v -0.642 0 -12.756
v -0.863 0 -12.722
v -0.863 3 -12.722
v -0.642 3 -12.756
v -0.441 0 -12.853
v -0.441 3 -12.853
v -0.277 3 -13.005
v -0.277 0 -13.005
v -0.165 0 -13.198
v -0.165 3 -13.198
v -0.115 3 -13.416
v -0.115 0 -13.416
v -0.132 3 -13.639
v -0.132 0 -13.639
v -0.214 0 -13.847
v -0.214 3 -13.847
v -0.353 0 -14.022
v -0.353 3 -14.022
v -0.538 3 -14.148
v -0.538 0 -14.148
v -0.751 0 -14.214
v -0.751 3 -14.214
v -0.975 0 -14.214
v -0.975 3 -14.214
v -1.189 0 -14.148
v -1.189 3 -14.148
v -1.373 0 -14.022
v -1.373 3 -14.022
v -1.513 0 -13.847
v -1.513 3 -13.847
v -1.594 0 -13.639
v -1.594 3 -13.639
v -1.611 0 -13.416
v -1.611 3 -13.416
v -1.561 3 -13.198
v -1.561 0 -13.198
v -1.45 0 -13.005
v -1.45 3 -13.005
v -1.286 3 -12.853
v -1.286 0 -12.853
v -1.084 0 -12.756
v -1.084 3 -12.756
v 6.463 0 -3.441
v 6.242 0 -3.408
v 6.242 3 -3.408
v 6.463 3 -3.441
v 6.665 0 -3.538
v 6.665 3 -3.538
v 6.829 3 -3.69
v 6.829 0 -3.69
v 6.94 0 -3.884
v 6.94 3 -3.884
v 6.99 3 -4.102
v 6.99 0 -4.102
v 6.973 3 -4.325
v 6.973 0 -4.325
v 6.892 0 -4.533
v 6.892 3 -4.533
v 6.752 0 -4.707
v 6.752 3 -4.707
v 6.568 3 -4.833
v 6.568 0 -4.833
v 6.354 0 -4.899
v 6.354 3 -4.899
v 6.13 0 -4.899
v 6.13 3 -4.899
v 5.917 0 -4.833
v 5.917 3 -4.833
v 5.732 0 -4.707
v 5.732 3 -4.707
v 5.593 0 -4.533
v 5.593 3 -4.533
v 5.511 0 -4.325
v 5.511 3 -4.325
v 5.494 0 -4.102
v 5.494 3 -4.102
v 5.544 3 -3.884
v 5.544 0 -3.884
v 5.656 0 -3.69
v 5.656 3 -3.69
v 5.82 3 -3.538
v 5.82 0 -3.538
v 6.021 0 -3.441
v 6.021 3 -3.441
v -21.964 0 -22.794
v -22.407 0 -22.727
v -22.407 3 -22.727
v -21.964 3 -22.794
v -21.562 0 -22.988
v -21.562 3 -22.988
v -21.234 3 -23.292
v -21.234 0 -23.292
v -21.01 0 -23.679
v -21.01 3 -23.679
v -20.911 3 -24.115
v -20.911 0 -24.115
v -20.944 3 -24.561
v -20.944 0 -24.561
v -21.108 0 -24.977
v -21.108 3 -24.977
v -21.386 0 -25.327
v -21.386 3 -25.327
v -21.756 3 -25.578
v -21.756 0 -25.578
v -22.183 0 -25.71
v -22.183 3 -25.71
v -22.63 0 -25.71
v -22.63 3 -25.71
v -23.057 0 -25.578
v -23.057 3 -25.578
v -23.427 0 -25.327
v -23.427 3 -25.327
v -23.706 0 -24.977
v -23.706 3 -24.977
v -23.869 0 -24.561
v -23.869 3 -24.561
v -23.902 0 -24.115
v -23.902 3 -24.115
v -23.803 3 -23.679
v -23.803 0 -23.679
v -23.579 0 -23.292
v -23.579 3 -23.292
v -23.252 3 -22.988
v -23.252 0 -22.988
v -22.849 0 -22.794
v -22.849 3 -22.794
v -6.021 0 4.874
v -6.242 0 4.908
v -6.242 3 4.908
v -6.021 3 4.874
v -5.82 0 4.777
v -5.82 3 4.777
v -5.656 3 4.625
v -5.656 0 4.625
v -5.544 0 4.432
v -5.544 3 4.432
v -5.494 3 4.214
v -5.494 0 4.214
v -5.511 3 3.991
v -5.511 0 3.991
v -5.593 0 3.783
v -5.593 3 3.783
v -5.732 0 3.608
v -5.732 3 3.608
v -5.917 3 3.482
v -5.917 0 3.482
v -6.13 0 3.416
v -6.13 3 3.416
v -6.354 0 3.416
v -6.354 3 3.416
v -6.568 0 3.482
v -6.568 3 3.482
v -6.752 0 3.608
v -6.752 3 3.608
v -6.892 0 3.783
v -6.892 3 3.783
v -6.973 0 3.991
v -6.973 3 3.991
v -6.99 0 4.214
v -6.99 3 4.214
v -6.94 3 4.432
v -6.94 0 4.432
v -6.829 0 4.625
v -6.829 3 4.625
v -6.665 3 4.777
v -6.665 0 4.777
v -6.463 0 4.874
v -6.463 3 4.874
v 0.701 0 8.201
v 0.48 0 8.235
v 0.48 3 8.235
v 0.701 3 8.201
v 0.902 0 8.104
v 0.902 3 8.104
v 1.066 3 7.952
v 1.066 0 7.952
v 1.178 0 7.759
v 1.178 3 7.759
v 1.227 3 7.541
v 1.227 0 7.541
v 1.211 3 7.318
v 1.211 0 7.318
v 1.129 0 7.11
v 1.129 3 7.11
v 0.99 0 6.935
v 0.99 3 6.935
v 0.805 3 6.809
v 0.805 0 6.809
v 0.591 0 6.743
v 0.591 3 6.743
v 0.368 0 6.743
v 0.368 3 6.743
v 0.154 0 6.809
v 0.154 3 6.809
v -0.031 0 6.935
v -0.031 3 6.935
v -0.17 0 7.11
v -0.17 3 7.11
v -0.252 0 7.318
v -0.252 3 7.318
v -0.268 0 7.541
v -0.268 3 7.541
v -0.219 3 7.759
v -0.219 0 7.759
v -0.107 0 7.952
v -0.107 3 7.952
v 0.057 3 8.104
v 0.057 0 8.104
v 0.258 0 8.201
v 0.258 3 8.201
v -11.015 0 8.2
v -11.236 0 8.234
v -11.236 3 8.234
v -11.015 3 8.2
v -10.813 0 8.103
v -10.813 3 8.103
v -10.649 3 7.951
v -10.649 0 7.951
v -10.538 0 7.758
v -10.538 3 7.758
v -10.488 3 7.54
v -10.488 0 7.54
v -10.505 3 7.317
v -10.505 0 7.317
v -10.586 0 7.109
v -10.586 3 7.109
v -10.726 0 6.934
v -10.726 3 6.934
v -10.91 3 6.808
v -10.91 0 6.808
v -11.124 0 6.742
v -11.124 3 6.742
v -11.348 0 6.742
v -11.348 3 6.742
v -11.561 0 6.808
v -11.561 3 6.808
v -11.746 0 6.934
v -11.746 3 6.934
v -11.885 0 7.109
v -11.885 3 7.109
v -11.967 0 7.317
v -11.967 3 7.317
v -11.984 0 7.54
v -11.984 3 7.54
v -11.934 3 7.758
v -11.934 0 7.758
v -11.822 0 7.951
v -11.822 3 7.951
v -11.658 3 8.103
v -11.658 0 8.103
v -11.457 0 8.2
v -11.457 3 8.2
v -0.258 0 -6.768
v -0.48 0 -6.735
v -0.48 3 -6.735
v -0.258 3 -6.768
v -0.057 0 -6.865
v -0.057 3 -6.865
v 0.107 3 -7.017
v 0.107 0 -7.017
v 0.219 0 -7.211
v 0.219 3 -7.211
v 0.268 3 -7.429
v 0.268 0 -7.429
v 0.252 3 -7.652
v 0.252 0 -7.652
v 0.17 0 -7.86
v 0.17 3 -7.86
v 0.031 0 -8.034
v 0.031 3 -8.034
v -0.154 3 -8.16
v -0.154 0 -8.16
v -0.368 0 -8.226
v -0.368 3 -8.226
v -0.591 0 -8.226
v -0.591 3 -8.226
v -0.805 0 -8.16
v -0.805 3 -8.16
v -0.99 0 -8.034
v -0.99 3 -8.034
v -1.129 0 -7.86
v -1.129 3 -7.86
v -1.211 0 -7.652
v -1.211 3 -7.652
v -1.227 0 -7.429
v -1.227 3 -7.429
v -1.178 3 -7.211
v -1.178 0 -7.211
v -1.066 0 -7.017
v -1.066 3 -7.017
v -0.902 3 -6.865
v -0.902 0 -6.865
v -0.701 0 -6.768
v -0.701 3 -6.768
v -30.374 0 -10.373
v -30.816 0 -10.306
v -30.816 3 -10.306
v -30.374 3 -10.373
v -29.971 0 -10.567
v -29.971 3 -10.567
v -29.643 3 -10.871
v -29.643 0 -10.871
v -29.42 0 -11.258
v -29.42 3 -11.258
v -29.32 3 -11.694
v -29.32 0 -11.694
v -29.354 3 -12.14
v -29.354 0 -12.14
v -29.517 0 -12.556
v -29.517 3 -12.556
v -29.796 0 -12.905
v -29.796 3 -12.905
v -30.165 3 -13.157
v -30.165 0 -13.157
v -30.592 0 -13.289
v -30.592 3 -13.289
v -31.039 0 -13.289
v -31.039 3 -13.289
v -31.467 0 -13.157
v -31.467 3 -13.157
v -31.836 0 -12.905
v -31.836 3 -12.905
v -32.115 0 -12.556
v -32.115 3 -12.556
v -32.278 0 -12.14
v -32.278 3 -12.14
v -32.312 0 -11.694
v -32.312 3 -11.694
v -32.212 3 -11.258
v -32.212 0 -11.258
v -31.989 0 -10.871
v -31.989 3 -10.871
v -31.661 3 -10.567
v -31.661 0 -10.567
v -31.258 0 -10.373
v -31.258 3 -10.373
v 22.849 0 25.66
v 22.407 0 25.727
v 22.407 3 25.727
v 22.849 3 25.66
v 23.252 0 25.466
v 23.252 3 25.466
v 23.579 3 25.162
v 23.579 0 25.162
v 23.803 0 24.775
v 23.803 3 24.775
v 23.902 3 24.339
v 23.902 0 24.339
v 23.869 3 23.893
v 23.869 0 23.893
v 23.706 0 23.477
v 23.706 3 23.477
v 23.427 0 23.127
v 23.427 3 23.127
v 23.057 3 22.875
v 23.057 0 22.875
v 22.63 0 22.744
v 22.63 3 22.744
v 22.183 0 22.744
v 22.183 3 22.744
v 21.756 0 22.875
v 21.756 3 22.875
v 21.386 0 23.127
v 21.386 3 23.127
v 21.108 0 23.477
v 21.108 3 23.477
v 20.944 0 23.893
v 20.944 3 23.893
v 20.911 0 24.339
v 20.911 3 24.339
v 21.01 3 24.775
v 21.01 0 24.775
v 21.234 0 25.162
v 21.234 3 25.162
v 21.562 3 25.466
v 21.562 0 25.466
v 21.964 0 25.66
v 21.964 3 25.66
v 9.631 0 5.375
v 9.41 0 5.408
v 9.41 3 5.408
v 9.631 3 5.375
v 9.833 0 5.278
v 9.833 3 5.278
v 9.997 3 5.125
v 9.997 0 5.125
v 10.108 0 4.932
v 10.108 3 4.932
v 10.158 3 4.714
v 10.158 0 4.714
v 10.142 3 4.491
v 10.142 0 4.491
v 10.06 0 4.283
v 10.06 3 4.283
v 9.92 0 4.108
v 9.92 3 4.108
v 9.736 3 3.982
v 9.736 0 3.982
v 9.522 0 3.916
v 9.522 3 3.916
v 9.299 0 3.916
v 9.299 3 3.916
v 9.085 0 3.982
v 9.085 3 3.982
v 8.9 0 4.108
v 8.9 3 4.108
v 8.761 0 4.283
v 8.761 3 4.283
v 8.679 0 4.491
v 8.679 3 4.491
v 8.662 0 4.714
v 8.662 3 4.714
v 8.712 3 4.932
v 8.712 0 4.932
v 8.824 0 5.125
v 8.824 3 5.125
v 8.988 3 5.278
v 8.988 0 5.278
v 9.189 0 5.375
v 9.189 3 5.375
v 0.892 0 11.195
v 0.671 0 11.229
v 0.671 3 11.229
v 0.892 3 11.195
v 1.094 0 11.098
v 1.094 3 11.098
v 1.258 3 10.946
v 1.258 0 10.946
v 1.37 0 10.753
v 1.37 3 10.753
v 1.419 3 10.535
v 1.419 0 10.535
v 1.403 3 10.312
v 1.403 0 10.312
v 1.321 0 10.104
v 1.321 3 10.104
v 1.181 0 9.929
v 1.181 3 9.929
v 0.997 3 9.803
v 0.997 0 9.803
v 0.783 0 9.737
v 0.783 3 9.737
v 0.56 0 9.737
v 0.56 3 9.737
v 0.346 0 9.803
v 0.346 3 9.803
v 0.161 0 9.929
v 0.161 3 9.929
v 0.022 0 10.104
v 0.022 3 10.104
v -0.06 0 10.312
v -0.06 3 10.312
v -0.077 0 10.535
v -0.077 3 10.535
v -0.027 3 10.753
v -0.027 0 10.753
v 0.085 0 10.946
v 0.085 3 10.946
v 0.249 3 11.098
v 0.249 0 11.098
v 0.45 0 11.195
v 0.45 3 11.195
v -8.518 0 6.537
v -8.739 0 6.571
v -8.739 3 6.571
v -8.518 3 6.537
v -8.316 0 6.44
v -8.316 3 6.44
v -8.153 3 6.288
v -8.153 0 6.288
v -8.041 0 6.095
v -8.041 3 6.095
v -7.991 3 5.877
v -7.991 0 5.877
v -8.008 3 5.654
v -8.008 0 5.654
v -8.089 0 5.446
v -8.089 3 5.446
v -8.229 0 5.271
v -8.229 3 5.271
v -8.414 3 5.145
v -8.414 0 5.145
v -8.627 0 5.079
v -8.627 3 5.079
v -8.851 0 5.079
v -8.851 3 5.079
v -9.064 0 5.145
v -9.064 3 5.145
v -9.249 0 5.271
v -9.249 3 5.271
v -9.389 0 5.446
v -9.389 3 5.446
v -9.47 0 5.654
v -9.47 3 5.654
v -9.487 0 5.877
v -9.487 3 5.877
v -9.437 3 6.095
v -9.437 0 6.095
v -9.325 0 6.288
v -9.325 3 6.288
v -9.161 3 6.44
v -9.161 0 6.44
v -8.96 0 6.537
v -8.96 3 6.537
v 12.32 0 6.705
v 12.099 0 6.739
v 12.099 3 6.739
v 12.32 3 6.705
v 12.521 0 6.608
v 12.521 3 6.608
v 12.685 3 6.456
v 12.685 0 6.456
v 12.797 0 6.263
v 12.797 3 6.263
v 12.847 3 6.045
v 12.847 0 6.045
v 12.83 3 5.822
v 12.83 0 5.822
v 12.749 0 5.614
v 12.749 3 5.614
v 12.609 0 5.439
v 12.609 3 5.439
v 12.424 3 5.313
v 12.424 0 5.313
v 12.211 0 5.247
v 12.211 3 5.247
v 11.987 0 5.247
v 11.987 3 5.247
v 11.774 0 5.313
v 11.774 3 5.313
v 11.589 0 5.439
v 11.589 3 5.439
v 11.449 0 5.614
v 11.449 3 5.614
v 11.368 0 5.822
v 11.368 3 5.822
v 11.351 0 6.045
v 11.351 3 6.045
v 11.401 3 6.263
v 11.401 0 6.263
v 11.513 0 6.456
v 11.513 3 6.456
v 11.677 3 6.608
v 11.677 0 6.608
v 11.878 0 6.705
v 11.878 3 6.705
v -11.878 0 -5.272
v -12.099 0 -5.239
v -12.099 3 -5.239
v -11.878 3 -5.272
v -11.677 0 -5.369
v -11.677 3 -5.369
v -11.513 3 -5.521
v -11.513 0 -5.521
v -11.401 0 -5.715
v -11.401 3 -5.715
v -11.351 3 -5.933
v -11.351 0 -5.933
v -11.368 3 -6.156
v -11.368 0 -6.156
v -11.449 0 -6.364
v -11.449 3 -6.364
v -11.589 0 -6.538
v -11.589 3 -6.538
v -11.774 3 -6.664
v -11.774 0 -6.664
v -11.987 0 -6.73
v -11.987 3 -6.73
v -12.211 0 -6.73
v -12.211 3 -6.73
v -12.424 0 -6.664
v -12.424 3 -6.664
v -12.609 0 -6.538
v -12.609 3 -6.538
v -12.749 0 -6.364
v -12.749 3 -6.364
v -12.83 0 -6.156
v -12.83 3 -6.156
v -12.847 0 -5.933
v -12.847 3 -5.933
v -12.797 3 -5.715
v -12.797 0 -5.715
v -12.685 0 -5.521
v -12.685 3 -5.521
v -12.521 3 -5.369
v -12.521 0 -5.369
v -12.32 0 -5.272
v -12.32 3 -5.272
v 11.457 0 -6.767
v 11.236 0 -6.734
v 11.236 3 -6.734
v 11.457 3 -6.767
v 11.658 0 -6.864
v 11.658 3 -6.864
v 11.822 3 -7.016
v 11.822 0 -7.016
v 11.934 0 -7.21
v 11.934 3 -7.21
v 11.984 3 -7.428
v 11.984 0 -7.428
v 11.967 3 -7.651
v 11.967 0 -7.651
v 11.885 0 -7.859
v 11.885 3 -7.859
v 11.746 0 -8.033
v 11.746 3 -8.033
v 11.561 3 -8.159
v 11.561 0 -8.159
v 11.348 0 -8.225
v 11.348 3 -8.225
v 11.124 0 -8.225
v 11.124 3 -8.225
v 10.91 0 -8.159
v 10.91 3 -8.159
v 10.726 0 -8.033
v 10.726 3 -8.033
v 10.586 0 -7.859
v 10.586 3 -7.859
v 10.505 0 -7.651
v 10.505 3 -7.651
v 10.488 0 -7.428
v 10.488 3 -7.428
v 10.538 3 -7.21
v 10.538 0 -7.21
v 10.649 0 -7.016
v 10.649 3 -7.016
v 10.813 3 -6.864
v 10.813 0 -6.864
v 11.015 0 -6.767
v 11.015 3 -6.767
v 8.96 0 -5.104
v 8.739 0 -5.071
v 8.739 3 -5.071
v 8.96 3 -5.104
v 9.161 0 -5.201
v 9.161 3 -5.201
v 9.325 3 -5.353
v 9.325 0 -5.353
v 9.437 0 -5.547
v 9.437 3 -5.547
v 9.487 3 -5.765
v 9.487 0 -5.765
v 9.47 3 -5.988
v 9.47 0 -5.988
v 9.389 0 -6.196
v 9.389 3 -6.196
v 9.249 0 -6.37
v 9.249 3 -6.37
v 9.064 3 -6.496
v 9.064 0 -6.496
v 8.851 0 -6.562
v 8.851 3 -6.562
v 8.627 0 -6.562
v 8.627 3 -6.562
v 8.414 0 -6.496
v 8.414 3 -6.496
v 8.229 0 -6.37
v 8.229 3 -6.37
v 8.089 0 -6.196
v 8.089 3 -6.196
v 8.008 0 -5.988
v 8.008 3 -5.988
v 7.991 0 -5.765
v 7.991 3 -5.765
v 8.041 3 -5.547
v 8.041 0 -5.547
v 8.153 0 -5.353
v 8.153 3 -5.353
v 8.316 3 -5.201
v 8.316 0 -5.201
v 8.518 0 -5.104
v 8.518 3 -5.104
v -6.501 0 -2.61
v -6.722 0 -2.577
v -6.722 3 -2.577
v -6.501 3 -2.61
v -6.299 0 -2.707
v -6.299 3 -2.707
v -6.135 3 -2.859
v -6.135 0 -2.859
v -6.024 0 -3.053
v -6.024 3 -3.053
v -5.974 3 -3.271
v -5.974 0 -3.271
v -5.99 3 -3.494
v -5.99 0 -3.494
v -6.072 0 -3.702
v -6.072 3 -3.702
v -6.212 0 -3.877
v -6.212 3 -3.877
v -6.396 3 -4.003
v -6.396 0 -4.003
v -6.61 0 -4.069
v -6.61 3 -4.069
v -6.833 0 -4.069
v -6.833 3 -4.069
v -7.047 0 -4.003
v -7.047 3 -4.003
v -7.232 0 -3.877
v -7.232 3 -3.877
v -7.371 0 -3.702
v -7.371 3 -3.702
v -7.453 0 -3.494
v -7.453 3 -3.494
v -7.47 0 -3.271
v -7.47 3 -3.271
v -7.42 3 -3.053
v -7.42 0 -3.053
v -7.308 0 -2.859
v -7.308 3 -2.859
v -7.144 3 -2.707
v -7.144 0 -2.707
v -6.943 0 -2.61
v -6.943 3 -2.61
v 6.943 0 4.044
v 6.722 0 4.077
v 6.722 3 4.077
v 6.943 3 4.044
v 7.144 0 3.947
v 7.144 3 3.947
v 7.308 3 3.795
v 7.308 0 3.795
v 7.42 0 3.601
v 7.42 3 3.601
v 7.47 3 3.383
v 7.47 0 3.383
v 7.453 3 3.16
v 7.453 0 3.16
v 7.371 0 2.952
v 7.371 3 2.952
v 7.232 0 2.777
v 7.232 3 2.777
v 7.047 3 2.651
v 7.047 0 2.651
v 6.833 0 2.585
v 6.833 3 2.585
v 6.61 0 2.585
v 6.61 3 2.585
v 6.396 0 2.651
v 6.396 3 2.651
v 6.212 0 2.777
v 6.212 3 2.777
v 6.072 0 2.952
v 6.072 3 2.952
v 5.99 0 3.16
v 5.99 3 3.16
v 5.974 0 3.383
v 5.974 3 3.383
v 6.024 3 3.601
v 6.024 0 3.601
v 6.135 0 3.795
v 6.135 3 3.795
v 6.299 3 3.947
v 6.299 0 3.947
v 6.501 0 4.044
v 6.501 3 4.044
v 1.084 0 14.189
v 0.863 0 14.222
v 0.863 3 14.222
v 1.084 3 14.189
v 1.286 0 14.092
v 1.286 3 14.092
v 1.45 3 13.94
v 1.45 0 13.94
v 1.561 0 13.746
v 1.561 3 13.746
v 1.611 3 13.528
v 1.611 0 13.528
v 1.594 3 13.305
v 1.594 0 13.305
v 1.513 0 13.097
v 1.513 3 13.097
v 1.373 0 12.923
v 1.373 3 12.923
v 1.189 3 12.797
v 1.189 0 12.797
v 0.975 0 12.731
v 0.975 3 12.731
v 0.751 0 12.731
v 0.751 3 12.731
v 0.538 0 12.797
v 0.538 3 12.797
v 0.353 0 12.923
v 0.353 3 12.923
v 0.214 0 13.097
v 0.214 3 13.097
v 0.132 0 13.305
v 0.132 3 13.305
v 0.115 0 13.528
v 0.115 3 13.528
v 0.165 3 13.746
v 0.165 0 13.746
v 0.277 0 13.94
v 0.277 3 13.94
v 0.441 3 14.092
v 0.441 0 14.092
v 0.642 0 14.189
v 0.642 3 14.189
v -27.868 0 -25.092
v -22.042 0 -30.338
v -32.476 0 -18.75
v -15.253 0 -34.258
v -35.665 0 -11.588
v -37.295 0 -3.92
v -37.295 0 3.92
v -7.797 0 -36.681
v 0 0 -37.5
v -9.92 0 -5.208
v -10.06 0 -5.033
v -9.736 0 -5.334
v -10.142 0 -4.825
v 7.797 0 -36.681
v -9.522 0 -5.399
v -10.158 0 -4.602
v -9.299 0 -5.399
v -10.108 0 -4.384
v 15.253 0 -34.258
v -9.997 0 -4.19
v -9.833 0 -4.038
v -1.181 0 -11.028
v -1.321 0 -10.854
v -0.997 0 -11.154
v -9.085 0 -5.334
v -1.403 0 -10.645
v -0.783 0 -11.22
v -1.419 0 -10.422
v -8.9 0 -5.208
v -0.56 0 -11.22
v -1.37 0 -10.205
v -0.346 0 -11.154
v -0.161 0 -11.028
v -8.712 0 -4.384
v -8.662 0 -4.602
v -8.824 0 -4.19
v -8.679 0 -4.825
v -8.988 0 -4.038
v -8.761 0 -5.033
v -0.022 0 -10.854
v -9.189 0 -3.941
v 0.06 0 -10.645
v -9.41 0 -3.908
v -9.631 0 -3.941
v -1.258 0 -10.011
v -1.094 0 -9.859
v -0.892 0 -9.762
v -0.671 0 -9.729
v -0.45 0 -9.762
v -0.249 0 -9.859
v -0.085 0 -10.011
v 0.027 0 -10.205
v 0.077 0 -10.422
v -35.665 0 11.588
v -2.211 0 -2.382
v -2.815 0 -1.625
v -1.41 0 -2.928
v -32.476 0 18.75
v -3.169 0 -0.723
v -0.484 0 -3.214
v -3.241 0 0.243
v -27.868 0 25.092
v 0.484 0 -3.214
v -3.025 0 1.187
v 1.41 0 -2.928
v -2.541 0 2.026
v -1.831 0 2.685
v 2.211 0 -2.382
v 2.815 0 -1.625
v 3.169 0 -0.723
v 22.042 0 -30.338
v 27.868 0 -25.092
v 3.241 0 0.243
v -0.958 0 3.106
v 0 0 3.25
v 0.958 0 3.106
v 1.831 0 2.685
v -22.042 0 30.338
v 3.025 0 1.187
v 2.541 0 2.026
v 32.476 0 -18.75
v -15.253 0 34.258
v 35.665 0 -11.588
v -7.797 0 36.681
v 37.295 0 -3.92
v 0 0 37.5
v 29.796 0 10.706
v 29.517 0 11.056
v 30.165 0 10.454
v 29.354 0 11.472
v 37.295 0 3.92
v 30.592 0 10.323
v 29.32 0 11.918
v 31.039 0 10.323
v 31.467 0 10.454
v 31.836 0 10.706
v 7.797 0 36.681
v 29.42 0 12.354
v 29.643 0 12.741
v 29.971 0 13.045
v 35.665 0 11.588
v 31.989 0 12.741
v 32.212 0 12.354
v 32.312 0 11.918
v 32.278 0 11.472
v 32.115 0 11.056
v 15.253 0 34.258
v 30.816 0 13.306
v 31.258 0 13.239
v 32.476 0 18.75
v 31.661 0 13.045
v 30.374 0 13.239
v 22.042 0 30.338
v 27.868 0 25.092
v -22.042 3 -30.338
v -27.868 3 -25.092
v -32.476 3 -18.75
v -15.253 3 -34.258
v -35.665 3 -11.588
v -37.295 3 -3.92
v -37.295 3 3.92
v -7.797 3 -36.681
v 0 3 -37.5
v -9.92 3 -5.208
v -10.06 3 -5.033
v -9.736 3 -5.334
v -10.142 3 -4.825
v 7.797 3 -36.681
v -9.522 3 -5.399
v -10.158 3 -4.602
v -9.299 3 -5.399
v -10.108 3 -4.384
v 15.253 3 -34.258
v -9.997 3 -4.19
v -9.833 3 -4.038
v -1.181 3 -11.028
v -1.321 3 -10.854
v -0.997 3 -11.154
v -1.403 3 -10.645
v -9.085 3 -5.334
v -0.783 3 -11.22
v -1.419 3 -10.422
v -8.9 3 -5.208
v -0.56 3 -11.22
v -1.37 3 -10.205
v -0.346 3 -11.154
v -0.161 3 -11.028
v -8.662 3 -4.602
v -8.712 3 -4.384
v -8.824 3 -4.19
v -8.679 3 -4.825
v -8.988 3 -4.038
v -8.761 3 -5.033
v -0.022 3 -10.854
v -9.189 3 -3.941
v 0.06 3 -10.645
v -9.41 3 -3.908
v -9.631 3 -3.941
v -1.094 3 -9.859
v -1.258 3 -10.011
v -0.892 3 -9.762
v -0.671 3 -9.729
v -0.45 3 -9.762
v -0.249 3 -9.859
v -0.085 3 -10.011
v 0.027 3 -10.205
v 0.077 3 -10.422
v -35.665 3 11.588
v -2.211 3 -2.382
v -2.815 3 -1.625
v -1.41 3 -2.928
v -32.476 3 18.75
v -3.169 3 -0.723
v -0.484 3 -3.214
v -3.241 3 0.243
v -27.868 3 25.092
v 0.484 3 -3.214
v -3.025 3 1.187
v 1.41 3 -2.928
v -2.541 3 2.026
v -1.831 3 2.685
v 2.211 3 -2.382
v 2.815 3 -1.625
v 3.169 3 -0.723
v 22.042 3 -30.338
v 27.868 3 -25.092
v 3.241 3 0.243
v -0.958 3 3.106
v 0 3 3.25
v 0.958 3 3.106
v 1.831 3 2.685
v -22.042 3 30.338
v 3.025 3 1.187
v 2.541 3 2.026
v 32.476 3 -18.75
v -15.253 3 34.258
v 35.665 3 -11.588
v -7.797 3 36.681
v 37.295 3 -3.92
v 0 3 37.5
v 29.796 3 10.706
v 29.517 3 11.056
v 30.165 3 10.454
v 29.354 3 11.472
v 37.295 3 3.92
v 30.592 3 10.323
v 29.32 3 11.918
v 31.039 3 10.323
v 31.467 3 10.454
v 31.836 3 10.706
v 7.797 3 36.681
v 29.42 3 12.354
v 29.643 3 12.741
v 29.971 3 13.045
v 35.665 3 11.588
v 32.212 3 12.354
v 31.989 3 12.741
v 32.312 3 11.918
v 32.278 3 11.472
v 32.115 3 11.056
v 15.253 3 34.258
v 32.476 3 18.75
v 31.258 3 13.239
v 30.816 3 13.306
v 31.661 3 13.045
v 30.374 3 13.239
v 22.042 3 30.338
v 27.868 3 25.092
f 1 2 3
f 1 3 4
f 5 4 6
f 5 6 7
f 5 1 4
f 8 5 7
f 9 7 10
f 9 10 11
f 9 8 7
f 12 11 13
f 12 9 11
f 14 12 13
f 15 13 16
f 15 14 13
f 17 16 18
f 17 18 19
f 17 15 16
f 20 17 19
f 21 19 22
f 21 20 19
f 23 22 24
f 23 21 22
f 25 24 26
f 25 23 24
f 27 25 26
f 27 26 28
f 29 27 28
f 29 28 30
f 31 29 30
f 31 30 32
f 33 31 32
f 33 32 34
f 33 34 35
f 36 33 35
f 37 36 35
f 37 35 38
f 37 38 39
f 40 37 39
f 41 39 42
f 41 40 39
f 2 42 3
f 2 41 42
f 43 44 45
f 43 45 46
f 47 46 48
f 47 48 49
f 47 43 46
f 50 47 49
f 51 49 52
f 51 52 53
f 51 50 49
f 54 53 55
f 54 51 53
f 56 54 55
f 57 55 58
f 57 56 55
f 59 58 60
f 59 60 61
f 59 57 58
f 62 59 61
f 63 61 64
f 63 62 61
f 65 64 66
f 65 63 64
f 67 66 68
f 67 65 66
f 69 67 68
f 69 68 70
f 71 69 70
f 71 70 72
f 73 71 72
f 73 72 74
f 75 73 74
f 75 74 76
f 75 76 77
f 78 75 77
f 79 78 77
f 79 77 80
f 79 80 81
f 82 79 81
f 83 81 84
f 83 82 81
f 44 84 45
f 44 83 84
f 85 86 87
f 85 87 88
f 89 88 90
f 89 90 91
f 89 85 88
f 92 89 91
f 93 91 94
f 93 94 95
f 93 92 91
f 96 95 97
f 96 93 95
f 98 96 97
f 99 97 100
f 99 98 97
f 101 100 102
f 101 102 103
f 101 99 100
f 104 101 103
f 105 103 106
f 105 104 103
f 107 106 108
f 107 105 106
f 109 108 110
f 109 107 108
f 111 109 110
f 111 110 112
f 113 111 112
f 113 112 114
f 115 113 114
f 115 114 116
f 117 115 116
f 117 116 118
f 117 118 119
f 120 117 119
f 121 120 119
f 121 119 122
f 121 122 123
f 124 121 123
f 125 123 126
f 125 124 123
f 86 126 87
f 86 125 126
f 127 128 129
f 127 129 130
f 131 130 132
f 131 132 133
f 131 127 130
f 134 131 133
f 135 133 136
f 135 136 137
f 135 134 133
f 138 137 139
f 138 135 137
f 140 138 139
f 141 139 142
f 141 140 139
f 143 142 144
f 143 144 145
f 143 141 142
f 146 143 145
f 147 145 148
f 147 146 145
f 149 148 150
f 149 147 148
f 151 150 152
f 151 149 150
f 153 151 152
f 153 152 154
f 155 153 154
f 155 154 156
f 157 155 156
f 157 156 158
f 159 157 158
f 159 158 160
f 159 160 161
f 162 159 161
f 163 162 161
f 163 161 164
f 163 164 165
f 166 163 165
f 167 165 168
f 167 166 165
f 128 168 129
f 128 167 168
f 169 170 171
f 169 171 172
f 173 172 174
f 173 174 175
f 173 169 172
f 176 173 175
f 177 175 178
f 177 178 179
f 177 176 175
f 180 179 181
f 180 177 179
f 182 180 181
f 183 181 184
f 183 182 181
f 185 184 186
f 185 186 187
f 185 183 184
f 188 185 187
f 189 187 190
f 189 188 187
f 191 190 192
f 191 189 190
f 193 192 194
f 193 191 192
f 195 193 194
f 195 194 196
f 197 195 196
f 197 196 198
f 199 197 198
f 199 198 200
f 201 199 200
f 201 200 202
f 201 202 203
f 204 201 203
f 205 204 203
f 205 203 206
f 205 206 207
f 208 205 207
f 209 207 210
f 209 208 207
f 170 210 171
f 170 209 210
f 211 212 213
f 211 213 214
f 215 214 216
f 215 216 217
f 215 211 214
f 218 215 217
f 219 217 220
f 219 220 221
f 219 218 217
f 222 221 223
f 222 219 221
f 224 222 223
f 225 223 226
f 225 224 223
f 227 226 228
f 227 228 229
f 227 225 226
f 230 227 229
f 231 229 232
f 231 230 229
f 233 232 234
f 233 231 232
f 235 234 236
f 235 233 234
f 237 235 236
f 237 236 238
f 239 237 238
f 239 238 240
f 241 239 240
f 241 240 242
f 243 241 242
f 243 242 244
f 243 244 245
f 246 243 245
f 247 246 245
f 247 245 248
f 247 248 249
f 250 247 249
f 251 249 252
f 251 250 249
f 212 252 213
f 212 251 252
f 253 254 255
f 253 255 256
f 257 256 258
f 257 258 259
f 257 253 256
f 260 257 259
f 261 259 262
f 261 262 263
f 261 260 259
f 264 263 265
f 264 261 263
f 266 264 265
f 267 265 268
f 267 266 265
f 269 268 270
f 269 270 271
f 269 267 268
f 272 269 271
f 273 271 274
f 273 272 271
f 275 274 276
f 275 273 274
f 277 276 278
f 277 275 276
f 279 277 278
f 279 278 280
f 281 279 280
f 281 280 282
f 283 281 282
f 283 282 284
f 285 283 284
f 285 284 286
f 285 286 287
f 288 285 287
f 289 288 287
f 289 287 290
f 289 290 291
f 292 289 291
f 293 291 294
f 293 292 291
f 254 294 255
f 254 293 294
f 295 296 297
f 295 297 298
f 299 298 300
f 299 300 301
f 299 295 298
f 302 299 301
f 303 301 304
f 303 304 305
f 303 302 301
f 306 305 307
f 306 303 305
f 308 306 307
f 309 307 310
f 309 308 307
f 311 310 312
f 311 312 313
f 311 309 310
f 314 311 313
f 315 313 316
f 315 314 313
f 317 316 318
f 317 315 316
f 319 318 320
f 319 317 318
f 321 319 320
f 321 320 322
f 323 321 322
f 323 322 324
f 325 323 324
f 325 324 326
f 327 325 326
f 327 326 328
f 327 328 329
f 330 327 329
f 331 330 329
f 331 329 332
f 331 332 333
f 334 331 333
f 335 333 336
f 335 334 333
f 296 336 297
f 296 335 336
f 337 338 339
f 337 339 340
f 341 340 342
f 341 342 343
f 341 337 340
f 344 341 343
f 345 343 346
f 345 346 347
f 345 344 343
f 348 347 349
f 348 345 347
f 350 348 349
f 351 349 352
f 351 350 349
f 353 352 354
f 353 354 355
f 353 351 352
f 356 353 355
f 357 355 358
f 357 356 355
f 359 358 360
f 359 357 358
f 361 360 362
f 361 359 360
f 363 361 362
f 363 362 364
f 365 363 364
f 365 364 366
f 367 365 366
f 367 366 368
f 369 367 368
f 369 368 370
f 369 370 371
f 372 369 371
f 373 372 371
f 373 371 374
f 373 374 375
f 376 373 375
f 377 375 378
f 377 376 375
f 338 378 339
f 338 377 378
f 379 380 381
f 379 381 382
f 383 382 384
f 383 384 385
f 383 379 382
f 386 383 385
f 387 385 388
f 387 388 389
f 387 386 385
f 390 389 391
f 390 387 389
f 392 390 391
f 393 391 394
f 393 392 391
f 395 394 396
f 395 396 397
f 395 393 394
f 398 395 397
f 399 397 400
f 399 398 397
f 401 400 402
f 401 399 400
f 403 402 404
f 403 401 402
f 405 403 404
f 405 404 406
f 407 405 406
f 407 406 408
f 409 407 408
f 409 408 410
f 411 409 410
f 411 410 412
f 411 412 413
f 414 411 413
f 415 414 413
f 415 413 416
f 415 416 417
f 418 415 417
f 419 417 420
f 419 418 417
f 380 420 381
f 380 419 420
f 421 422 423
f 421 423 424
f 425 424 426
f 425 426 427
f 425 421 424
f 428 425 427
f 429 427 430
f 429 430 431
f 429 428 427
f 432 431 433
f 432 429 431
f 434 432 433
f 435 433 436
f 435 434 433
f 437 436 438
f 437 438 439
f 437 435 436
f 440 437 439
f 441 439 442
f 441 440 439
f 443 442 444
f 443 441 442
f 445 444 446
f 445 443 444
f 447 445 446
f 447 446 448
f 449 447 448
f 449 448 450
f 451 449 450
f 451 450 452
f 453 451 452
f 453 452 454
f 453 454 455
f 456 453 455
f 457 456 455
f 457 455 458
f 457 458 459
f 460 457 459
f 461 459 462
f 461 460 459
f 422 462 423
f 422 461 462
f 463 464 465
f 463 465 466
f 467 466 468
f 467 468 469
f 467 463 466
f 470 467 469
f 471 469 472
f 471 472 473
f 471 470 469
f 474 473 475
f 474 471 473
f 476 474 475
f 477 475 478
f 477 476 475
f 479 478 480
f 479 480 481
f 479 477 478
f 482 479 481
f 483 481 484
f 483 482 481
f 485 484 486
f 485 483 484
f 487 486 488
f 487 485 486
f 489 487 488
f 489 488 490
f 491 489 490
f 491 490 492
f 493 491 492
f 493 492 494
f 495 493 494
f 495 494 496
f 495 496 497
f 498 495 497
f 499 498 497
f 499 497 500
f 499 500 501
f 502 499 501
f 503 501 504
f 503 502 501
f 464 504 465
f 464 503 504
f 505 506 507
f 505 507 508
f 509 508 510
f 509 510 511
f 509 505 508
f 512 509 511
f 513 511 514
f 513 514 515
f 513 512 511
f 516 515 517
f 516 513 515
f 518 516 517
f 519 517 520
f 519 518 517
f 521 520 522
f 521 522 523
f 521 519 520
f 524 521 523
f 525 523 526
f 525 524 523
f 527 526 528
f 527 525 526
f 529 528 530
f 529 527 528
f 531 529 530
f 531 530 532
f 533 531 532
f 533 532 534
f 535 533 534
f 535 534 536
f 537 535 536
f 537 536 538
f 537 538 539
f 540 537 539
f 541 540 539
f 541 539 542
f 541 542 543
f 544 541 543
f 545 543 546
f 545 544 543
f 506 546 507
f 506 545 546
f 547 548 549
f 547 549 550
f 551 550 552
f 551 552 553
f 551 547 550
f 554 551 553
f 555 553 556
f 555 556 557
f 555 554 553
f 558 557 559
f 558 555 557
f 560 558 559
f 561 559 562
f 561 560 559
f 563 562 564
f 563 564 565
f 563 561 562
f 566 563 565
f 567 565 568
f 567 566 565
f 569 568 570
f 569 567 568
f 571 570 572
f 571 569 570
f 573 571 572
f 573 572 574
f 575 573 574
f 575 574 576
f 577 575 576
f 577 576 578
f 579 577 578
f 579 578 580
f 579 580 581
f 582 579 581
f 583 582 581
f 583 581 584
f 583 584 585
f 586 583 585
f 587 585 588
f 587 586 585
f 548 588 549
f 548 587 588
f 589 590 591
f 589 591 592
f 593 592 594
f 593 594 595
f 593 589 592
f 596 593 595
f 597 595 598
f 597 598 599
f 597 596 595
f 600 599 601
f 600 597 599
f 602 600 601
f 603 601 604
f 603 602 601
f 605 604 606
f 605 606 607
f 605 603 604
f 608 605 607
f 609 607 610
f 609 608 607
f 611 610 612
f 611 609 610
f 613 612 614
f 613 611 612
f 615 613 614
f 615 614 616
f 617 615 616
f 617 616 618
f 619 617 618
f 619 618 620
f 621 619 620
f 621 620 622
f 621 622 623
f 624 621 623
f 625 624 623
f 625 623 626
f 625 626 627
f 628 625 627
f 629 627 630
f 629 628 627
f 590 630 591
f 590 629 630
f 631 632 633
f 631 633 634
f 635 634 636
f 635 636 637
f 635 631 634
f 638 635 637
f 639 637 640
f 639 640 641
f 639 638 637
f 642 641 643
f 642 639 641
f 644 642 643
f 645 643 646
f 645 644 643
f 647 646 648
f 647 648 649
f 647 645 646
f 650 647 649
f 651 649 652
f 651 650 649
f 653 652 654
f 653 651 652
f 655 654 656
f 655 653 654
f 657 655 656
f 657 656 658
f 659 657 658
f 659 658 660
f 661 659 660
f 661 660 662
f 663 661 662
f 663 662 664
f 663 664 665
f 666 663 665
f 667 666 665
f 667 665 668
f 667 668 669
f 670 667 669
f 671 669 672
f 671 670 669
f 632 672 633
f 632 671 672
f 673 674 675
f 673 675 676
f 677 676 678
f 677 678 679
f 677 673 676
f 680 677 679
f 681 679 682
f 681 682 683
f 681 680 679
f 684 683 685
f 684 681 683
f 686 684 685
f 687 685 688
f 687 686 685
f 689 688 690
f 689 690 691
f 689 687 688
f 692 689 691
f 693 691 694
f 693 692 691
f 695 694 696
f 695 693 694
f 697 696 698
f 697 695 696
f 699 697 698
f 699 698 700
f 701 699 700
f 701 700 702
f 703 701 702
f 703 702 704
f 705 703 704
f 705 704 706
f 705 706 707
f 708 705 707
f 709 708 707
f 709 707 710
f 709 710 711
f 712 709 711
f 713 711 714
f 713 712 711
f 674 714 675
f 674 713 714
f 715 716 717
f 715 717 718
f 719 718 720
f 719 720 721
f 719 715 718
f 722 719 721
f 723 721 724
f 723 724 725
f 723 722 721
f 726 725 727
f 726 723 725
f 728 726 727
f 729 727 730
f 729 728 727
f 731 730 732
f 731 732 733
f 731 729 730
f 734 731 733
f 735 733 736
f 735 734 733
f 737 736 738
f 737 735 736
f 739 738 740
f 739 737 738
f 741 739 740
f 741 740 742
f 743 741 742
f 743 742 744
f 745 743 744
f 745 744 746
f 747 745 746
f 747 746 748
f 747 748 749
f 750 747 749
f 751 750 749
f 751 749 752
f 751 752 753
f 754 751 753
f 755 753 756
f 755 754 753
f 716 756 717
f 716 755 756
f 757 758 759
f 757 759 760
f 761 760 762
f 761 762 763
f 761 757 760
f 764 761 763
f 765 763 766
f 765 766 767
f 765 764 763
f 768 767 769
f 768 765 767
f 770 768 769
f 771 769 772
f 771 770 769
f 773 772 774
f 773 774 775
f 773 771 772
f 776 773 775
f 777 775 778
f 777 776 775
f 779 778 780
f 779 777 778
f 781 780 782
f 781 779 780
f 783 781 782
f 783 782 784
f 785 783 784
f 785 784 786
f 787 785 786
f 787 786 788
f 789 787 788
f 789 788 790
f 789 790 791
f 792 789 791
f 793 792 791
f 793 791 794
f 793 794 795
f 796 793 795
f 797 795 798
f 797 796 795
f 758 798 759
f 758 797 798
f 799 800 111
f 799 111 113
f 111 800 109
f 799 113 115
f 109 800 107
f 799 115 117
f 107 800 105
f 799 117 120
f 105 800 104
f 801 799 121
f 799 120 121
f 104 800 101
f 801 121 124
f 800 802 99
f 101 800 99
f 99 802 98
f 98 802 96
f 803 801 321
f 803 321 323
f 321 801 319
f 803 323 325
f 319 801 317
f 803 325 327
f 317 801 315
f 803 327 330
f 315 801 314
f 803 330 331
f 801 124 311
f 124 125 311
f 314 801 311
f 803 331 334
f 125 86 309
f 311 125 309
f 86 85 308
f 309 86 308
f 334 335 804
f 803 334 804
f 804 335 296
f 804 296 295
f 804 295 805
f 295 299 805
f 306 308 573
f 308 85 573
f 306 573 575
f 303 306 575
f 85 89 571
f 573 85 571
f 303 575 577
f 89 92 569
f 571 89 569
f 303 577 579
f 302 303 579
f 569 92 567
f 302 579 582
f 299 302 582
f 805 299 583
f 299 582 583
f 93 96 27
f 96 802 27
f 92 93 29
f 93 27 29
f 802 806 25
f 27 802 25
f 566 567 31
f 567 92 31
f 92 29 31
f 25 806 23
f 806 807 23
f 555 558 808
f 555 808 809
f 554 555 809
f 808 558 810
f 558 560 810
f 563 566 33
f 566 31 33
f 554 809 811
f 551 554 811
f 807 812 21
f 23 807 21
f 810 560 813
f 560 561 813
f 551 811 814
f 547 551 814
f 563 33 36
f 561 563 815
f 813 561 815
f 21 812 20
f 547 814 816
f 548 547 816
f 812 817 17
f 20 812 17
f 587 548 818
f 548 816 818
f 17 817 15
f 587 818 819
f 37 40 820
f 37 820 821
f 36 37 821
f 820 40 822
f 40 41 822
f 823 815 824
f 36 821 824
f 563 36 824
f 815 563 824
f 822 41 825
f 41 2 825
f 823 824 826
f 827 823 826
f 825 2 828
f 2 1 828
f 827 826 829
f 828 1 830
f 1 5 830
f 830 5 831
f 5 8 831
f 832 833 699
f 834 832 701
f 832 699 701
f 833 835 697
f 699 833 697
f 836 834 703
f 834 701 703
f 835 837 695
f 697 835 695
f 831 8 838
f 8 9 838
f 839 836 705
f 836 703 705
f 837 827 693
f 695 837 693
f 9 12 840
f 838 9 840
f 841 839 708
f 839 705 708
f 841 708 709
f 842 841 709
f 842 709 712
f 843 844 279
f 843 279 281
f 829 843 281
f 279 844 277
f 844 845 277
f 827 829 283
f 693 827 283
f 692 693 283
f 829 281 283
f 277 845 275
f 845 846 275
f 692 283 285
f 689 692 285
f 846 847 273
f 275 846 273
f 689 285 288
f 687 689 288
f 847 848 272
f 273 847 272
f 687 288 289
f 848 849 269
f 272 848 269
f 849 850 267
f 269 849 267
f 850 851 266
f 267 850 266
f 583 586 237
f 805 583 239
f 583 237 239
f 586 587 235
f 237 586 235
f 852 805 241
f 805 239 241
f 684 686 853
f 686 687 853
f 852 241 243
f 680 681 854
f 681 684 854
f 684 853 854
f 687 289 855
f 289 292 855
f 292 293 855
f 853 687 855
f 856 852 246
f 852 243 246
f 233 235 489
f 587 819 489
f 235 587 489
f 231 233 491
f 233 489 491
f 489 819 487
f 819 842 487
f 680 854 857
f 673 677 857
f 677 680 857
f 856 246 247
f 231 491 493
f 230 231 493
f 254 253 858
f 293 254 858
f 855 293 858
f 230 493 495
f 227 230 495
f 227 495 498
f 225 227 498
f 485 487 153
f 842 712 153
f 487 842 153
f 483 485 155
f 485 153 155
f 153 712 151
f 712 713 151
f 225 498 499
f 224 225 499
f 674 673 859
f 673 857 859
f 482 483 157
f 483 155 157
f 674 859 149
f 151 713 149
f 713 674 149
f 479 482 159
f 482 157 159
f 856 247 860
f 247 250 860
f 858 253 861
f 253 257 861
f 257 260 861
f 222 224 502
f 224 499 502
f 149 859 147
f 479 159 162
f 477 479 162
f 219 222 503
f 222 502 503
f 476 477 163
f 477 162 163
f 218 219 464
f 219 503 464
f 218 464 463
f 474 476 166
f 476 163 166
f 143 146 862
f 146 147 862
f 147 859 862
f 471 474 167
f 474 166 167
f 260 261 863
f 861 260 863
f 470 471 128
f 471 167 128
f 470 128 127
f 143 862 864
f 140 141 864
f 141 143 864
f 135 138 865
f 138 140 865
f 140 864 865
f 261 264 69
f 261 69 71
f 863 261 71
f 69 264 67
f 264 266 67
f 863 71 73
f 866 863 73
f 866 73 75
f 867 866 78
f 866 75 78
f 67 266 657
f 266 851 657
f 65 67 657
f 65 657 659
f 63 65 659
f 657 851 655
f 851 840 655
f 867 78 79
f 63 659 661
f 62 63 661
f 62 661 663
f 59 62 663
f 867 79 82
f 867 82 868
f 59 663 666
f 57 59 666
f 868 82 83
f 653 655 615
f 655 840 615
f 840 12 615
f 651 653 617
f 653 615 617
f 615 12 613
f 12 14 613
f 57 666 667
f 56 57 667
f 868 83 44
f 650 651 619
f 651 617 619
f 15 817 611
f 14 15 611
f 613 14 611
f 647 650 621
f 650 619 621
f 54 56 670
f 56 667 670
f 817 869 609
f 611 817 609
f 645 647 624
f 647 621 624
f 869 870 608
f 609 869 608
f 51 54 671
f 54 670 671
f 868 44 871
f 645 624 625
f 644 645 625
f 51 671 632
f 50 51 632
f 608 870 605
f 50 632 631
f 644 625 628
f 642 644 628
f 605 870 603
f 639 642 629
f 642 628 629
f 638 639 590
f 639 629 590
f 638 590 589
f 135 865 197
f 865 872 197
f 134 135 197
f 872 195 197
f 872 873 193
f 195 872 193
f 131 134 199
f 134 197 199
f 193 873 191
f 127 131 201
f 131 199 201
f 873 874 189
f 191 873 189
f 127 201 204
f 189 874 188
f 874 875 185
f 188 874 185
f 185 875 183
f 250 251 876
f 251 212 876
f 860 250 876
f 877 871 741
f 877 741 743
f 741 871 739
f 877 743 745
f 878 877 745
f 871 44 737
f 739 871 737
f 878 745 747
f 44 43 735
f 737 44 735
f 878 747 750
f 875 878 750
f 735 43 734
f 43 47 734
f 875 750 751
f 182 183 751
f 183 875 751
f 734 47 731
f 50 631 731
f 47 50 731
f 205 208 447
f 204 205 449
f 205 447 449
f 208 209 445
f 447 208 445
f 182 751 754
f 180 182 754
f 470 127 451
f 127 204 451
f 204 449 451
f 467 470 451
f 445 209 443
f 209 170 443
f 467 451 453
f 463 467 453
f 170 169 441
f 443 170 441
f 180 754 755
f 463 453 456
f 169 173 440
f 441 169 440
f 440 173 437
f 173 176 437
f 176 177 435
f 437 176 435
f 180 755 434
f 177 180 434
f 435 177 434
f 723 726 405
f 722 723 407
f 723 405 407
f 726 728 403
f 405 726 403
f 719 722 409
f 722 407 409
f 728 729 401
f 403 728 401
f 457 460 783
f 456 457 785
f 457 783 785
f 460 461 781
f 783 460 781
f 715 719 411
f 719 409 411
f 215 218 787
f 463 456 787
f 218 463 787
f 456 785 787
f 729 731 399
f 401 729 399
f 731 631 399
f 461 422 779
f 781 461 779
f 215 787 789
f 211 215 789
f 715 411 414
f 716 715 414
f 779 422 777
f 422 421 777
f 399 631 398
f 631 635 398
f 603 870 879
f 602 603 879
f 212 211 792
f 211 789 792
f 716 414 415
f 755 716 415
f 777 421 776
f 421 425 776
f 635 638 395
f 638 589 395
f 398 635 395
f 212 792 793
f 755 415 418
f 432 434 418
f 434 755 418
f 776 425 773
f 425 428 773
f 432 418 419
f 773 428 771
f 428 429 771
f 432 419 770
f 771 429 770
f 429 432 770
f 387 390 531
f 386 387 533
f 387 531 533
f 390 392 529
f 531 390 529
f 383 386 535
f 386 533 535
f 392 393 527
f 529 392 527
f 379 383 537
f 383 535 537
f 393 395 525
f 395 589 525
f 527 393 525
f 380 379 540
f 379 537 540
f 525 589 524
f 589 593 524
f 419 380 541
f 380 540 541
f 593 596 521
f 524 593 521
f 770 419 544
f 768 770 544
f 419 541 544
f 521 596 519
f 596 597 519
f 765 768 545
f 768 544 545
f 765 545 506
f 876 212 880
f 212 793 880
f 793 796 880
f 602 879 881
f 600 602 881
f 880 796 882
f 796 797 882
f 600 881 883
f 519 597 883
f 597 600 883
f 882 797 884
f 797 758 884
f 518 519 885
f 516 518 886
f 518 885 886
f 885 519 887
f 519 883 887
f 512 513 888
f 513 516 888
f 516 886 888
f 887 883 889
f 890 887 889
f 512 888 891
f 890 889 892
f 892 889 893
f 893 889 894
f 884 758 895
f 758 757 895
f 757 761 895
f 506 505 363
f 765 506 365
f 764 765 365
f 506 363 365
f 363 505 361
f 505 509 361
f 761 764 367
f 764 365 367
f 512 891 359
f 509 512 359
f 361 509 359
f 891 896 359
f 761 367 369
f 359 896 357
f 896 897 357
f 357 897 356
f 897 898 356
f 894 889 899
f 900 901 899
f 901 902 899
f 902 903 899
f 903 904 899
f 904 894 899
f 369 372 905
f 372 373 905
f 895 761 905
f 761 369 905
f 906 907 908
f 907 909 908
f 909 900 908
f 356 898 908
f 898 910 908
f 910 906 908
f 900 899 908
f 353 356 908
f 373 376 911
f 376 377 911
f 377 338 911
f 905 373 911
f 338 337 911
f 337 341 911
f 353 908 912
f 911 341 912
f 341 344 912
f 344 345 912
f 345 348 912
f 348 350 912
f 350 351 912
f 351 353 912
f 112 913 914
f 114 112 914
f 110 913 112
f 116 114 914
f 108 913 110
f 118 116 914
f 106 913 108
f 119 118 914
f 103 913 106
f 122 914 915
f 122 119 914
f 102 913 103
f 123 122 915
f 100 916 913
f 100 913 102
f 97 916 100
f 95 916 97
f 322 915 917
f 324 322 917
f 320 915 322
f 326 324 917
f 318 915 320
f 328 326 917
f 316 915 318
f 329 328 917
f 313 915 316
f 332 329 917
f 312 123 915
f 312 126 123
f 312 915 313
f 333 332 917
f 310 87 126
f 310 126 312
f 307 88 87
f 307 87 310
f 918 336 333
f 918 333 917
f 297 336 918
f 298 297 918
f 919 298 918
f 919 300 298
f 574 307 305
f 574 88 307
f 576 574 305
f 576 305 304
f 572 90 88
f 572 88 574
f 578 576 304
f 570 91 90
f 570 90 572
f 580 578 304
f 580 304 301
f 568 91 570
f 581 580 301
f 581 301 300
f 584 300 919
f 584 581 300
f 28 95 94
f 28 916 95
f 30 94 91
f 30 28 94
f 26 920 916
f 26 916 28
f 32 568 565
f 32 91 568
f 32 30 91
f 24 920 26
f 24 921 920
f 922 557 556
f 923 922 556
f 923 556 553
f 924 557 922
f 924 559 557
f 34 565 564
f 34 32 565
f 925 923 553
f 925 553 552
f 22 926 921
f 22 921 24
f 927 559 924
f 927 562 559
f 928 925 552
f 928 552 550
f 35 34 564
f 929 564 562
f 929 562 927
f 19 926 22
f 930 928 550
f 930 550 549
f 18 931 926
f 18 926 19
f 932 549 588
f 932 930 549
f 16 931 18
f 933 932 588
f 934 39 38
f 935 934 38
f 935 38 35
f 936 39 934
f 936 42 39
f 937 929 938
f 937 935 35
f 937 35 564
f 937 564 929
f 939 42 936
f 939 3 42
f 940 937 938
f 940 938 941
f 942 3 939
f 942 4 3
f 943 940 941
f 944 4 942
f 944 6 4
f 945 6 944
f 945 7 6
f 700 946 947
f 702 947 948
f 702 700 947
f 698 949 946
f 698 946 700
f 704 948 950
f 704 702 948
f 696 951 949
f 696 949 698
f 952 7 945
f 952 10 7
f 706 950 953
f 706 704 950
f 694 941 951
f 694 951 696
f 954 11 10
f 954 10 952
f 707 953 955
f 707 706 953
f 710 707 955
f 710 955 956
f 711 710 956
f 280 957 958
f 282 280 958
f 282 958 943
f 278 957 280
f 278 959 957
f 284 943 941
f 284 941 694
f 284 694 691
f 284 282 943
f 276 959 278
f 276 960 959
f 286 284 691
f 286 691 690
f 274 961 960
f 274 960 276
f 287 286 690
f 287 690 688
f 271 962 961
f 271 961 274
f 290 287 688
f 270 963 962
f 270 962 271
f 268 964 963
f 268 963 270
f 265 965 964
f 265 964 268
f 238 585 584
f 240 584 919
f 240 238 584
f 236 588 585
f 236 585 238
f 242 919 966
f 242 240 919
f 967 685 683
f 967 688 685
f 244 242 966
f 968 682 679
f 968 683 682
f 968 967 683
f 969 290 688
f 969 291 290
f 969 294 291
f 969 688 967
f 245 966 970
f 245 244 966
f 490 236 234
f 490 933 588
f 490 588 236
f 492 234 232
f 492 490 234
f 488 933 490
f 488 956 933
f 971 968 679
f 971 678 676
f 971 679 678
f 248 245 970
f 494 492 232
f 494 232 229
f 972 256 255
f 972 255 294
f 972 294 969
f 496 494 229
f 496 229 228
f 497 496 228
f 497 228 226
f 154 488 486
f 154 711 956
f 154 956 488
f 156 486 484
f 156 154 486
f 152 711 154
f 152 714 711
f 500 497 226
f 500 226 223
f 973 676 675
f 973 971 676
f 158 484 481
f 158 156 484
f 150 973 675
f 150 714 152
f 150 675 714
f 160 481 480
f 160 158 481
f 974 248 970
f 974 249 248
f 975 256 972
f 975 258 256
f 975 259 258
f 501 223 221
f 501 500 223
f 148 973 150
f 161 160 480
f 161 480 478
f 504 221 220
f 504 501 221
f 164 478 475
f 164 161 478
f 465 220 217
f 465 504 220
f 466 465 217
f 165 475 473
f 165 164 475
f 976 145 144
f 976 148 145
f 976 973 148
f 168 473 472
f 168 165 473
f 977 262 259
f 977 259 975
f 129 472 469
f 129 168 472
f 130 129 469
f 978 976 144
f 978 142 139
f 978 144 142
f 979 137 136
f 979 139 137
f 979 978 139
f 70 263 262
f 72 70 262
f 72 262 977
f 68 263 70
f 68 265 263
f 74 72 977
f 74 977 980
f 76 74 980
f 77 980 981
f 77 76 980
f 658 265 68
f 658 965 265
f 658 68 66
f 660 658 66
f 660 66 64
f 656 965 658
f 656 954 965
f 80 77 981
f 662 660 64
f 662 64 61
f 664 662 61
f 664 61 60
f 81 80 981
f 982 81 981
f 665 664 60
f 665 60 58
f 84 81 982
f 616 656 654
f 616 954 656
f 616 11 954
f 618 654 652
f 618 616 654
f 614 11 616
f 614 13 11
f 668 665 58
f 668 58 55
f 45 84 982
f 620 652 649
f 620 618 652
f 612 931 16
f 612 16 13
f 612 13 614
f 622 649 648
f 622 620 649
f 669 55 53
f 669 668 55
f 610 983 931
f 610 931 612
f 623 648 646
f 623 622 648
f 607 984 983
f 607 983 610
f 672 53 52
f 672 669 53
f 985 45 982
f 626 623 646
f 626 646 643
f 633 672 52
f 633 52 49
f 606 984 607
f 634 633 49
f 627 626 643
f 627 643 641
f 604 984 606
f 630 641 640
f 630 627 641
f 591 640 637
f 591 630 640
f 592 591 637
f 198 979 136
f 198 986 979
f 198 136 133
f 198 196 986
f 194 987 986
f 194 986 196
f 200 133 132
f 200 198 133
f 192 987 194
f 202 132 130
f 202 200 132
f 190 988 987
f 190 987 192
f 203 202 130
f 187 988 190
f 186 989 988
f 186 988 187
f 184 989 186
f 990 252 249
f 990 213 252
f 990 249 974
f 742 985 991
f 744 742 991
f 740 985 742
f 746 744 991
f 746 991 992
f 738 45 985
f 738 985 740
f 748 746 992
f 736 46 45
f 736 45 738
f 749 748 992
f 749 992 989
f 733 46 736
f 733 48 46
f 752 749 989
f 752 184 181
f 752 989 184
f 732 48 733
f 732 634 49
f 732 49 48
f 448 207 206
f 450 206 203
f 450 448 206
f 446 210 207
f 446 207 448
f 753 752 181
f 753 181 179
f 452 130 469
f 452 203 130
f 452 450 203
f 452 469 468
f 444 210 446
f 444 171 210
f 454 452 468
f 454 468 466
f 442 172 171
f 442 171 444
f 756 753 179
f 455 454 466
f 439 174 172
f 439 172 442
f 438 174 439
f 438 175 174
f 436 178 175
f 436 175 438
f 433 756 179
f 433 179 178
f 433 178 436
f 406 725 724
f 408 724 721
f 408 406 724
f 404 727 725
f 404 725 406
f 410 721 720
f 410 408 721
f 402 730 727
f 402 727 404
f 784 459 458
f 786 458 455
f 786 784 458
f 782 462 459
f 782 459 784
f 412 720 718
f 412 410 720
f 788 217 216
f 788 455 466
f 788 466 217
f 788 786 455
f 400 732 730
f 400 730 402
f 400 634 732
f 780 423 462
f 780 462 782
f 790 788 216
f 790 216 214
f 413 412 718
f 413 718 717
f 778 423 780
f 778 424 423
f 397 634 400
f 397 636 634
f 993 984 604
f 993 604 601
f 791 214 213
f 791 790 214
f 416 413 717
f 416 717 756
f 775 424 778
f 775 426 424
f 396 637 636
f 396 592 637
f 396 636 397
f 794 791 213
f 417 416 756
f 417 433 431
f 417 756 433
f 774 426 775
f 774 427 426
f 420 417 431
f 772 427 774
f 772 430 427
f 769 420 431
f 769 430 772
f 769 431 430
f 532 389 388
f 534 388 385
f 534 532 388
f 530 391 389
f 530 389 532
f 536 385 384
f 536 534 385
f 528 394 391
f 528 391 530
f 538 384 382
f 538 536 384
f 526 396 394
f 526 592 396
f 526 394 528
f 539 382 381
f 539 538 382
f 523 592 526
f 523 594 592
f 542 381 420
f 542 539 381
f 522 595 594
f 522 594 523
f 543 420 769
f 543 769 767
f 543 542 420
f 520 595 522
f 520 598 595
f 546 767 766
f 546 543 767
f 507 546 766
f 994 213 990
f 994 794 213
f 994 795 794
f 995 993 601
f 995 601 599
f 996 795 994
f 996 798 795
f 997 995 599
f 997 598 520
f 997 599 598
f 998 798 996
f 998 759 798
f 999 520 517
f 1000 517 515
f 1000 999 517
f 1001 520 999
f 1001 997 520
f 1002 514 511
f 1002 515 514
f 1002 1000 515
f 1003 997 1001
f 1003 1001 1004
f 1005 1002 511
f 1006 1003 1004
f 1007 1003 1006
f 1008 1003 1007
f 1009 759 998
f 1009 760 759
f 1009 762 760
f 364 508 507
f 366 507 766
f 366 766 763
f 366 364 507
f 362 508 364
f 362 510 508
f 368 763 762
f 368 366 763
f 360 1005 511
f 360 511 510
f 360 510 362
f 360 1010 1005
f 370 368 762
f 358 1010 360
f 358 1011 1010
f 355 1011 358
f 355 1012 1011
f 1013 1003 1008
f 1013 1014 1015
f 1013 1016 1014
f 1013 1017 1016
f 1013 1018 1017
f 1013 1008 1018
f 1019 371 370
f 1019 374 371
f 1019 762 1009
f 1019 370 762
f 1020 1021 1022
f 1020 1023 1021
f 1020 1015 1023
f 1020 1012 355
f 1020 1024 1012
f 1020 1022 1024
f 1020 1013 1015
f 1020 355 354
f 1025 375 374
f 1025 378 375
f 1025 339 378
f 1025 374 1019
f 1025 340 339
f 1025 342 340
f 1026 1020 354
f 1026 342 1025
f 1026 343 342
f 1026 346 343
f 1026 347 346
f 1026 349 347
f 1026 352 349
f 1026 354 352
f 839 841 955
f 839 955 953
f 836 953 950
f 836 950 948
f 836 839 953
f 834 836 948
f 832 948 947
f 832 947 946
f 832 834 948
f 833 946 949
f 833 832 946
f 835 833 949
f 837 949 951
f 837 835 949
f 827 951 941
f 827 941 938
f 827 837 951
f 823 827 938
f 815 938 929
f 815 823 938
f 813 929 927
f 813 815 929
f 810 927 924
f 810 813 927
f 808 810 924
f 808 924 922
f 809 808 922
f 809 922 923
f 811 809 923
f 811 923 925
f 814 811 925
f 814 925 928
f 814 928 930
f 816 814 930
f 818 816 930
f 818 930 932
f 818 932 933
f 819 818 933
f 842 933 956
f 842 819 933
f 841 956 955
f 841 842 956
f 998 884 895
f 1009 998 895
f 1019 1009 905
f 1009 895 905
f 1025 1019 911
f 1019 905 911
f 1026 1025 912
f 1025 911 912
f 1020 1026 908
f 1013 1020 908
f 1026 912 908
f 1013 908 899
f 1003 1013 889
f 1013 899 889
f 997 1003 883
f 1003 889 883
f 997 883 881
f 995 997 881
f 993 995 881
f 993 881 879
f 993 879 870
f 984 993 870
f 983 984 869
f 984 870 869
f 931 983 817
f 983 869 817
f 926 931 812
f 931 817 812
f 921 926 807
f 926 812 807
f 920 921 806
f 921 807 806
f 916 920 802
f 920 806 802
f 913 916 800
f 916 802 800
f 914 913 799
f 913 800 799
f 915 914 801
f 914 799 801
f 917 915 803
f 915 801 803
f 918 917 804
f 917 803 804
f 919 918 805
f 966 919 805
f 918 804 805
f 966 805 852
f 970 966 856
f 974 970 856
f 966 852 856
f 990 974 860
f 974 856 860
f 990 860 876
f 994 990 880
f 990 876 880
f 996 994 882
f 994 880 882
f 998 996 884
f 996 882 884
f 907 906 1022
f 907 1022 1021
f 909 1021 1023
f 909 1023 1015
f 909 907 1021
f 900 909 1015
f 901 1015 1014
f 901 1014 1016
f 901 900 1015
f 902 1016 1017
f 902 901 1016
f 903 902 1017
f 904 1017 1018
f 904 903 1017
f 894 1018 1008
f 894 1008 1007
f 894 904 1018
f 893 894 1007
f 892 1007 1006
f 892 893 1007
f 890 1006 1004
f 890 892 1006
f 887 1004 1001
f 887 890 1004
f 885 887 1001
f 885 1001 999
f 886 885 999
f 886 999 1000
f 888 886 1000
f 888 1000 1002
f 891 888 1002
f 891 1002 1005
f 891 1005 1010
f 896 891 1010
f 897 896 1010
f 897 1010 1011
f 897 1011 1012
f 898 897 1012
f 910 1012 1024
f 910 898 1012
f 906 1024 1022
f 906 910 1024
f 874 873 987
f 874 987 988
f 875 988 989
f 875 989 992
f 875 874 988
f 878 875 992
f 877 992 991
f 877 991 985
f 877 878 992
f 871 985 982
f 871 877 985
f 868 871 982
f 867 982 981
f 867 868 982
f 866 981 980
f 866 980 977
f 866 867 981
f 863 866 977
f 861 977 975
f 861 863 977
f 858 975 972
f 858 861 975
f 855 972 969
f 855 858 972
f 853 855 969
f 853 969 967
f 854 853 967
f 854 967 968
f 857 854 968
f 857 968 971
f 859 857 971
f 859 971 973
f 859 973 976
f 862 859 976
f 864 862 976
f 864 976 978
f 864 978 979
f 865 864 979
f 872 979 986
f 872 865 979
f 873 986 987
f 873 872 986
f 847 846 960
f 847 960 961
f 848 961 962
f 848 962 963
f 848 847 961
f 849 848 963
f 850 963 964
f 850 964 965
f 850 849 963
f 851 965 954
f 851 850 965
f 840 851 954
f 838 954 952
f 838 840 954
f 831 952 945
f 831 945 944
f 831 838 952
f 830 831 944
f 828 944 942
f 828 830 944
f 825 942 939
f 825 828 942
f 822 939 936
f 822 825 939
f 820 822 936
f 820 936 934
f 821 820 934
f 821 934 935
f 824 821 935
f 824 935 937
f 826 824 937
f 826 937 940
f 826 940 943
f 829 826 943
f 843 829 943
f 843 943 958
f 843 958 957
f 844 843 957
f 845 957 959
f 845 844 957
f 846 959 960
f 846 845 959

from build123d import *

# Parameters (mm, degrees)
SKETCH1_R           = 37.5
SKETCH1_R_2         = 0.75
SKETCH1_R_3         = 3.25
SKETCH1_R_4         = 1.5
BOSS_EXTRUDE1_DEPTH = 3


with BuildPart() as part:
    # Sketch1 → Boss-Extrude1 (new body)
    with BuildSketch(Plane(origin=(0, 0, 0), x_dir=(1, 0, 0), z_dir=(0, 1, 0))):
        with Locations(Location((0, 0, 0), (0, 0, 270))):
            Circle(SKETCH1_R)
        with Locations(Location((-0.863160321, 13.472377454, 0), (0, 0, 270))):
            Circle(SKETCH1_R_2, mode=Mode.SUBTRACT)
        with Locations(Location((-0.671346916, 10.478515797, 0), (0, 0, 270))):
            Circle(SKETCH1_R_2, mode=Mode.SUBTRACT)
        with Locations(Location((-0.479533512, 7.484654141, 0), (0, 0, 270))):
            Circle(SKETCH1_R_2, mode=Mode.SUBTRACT)
        with Locations(Location((6.242133869, 4.157615274, 0), (0, 0, 270))):
            Circle(SKETCH1_R_2, mode=Mode.SUBTRACT)
        with Locations(Location((8.738987416, 5.820661383, 0), (0, 0, 270))):
            Circle(SKETCH1_R_2, mode=Mode.SUBTRACT)
        with Locations(Location((11.235840964, 7.483707492, 0), (0, 0, 270))):
            Circle(SKETCH1_R_2, mode=Mode.SUBTRACT)
        with Locations(Location((-12.099001285, 5.988669961, 0), (0, 0, 270))):
            Circle(SKETCH1_R_2, mode=Mode.SUBTRACT)
        with Locations(Location((-9.410334333, 4.657854414, 0), (0, 0, 270))):
            Circle(SKETCH1_R_2, mode=Mode.SUBTRACT)
        with Locations(Location((-6.721667381, 3.327038867, 0), (0, 0, 270))):
            Circle(SKETCH1_R_2, mode=Mode.SUBTRACT)
        with Locations(Location((6.721667381, -3.327038867, 0), (0, 0, 270))):
            Circle(SKETCH1_R_2, mode=Mode.SUBTRACT)
        with Locations(Location((9.410334333, -4.657854414, 0), (0, 0, 270))):
            Circle(SKETCH1_R_2, mode=Mode.SUBTRACT)
        with Locations(Location((12.099001285, -5.988669961, 0), (0, 0, 270))):
            Circle(SKETCH1_R_2, mode=Mode.SUBTRACT)
        with Locations(Location((-11.235840964, -7.483707492, 0), (0, 0, 270))):
            Circle(SKETCH1_R_2, mode=Mode.SUBTRACT)
        with Locations(Location((-8.738987416, -5.820661383, 0), (0, 0, 270))):
            Circle(SKETCH1_R_2, mode=Mode.SUBTRACT)
        with Locations(Location((-6.242133869, -4.157615274, 0), (0, 0, 270))):
            Circle(SKETCH1_R_2, mode=Mode.SUBTRACT)
        with Locations(Location((0.479533512, -7.484654141, 0), (0, 0, 270))):
            Circle(SKETCH1_R_2, mode=Mode.SUBTRACT)
        with Locations(Location((0.671346916, -10.478515797, 0), (0, 0, 270))):
            Circle(SKETCH1_R_2, mode=Mode.SUBTRACT)
        with Locations(Location((0.863160321, -13.472377454, 0), (0, 0, 270))):
            Circle(SKETCH1_R_2, mode=Mode.SUBTRACT)
        with Locations(Location((0, 0, 0), (0, 0, 270))):
            Circle(SKETCH1_R_3, mode=Mode.SUBTRACT)
        with Locations(Location((-22.406587981, 24.226943989, 0), (0, 0, 270))):
            Circle(SKETCH1_R_4, mode=Mode.SUBTRACT)
        with Locations(Location((-30.815927231, 11.805872643, 0), (0, 0, 270))):
            Circle(SKETCH1_R_4, mode=Mode.SUBTRACT)
        with Locations(Location((30.815927231, -11.805872643, 0), (0, 0, 270))):
            Circle(SKETCH1_R_4, mode=Mode.SUBTRACT)
        with Locations(Location((22.406587981, -24.226943989, 0), (0, 0, 270))):
            Circle(SKETCH1_R_4, mode=Mode.SUBTRACT)
    extrude(amount=BOSS_EXTRUDE1_DEPTH)


solid = part.part
